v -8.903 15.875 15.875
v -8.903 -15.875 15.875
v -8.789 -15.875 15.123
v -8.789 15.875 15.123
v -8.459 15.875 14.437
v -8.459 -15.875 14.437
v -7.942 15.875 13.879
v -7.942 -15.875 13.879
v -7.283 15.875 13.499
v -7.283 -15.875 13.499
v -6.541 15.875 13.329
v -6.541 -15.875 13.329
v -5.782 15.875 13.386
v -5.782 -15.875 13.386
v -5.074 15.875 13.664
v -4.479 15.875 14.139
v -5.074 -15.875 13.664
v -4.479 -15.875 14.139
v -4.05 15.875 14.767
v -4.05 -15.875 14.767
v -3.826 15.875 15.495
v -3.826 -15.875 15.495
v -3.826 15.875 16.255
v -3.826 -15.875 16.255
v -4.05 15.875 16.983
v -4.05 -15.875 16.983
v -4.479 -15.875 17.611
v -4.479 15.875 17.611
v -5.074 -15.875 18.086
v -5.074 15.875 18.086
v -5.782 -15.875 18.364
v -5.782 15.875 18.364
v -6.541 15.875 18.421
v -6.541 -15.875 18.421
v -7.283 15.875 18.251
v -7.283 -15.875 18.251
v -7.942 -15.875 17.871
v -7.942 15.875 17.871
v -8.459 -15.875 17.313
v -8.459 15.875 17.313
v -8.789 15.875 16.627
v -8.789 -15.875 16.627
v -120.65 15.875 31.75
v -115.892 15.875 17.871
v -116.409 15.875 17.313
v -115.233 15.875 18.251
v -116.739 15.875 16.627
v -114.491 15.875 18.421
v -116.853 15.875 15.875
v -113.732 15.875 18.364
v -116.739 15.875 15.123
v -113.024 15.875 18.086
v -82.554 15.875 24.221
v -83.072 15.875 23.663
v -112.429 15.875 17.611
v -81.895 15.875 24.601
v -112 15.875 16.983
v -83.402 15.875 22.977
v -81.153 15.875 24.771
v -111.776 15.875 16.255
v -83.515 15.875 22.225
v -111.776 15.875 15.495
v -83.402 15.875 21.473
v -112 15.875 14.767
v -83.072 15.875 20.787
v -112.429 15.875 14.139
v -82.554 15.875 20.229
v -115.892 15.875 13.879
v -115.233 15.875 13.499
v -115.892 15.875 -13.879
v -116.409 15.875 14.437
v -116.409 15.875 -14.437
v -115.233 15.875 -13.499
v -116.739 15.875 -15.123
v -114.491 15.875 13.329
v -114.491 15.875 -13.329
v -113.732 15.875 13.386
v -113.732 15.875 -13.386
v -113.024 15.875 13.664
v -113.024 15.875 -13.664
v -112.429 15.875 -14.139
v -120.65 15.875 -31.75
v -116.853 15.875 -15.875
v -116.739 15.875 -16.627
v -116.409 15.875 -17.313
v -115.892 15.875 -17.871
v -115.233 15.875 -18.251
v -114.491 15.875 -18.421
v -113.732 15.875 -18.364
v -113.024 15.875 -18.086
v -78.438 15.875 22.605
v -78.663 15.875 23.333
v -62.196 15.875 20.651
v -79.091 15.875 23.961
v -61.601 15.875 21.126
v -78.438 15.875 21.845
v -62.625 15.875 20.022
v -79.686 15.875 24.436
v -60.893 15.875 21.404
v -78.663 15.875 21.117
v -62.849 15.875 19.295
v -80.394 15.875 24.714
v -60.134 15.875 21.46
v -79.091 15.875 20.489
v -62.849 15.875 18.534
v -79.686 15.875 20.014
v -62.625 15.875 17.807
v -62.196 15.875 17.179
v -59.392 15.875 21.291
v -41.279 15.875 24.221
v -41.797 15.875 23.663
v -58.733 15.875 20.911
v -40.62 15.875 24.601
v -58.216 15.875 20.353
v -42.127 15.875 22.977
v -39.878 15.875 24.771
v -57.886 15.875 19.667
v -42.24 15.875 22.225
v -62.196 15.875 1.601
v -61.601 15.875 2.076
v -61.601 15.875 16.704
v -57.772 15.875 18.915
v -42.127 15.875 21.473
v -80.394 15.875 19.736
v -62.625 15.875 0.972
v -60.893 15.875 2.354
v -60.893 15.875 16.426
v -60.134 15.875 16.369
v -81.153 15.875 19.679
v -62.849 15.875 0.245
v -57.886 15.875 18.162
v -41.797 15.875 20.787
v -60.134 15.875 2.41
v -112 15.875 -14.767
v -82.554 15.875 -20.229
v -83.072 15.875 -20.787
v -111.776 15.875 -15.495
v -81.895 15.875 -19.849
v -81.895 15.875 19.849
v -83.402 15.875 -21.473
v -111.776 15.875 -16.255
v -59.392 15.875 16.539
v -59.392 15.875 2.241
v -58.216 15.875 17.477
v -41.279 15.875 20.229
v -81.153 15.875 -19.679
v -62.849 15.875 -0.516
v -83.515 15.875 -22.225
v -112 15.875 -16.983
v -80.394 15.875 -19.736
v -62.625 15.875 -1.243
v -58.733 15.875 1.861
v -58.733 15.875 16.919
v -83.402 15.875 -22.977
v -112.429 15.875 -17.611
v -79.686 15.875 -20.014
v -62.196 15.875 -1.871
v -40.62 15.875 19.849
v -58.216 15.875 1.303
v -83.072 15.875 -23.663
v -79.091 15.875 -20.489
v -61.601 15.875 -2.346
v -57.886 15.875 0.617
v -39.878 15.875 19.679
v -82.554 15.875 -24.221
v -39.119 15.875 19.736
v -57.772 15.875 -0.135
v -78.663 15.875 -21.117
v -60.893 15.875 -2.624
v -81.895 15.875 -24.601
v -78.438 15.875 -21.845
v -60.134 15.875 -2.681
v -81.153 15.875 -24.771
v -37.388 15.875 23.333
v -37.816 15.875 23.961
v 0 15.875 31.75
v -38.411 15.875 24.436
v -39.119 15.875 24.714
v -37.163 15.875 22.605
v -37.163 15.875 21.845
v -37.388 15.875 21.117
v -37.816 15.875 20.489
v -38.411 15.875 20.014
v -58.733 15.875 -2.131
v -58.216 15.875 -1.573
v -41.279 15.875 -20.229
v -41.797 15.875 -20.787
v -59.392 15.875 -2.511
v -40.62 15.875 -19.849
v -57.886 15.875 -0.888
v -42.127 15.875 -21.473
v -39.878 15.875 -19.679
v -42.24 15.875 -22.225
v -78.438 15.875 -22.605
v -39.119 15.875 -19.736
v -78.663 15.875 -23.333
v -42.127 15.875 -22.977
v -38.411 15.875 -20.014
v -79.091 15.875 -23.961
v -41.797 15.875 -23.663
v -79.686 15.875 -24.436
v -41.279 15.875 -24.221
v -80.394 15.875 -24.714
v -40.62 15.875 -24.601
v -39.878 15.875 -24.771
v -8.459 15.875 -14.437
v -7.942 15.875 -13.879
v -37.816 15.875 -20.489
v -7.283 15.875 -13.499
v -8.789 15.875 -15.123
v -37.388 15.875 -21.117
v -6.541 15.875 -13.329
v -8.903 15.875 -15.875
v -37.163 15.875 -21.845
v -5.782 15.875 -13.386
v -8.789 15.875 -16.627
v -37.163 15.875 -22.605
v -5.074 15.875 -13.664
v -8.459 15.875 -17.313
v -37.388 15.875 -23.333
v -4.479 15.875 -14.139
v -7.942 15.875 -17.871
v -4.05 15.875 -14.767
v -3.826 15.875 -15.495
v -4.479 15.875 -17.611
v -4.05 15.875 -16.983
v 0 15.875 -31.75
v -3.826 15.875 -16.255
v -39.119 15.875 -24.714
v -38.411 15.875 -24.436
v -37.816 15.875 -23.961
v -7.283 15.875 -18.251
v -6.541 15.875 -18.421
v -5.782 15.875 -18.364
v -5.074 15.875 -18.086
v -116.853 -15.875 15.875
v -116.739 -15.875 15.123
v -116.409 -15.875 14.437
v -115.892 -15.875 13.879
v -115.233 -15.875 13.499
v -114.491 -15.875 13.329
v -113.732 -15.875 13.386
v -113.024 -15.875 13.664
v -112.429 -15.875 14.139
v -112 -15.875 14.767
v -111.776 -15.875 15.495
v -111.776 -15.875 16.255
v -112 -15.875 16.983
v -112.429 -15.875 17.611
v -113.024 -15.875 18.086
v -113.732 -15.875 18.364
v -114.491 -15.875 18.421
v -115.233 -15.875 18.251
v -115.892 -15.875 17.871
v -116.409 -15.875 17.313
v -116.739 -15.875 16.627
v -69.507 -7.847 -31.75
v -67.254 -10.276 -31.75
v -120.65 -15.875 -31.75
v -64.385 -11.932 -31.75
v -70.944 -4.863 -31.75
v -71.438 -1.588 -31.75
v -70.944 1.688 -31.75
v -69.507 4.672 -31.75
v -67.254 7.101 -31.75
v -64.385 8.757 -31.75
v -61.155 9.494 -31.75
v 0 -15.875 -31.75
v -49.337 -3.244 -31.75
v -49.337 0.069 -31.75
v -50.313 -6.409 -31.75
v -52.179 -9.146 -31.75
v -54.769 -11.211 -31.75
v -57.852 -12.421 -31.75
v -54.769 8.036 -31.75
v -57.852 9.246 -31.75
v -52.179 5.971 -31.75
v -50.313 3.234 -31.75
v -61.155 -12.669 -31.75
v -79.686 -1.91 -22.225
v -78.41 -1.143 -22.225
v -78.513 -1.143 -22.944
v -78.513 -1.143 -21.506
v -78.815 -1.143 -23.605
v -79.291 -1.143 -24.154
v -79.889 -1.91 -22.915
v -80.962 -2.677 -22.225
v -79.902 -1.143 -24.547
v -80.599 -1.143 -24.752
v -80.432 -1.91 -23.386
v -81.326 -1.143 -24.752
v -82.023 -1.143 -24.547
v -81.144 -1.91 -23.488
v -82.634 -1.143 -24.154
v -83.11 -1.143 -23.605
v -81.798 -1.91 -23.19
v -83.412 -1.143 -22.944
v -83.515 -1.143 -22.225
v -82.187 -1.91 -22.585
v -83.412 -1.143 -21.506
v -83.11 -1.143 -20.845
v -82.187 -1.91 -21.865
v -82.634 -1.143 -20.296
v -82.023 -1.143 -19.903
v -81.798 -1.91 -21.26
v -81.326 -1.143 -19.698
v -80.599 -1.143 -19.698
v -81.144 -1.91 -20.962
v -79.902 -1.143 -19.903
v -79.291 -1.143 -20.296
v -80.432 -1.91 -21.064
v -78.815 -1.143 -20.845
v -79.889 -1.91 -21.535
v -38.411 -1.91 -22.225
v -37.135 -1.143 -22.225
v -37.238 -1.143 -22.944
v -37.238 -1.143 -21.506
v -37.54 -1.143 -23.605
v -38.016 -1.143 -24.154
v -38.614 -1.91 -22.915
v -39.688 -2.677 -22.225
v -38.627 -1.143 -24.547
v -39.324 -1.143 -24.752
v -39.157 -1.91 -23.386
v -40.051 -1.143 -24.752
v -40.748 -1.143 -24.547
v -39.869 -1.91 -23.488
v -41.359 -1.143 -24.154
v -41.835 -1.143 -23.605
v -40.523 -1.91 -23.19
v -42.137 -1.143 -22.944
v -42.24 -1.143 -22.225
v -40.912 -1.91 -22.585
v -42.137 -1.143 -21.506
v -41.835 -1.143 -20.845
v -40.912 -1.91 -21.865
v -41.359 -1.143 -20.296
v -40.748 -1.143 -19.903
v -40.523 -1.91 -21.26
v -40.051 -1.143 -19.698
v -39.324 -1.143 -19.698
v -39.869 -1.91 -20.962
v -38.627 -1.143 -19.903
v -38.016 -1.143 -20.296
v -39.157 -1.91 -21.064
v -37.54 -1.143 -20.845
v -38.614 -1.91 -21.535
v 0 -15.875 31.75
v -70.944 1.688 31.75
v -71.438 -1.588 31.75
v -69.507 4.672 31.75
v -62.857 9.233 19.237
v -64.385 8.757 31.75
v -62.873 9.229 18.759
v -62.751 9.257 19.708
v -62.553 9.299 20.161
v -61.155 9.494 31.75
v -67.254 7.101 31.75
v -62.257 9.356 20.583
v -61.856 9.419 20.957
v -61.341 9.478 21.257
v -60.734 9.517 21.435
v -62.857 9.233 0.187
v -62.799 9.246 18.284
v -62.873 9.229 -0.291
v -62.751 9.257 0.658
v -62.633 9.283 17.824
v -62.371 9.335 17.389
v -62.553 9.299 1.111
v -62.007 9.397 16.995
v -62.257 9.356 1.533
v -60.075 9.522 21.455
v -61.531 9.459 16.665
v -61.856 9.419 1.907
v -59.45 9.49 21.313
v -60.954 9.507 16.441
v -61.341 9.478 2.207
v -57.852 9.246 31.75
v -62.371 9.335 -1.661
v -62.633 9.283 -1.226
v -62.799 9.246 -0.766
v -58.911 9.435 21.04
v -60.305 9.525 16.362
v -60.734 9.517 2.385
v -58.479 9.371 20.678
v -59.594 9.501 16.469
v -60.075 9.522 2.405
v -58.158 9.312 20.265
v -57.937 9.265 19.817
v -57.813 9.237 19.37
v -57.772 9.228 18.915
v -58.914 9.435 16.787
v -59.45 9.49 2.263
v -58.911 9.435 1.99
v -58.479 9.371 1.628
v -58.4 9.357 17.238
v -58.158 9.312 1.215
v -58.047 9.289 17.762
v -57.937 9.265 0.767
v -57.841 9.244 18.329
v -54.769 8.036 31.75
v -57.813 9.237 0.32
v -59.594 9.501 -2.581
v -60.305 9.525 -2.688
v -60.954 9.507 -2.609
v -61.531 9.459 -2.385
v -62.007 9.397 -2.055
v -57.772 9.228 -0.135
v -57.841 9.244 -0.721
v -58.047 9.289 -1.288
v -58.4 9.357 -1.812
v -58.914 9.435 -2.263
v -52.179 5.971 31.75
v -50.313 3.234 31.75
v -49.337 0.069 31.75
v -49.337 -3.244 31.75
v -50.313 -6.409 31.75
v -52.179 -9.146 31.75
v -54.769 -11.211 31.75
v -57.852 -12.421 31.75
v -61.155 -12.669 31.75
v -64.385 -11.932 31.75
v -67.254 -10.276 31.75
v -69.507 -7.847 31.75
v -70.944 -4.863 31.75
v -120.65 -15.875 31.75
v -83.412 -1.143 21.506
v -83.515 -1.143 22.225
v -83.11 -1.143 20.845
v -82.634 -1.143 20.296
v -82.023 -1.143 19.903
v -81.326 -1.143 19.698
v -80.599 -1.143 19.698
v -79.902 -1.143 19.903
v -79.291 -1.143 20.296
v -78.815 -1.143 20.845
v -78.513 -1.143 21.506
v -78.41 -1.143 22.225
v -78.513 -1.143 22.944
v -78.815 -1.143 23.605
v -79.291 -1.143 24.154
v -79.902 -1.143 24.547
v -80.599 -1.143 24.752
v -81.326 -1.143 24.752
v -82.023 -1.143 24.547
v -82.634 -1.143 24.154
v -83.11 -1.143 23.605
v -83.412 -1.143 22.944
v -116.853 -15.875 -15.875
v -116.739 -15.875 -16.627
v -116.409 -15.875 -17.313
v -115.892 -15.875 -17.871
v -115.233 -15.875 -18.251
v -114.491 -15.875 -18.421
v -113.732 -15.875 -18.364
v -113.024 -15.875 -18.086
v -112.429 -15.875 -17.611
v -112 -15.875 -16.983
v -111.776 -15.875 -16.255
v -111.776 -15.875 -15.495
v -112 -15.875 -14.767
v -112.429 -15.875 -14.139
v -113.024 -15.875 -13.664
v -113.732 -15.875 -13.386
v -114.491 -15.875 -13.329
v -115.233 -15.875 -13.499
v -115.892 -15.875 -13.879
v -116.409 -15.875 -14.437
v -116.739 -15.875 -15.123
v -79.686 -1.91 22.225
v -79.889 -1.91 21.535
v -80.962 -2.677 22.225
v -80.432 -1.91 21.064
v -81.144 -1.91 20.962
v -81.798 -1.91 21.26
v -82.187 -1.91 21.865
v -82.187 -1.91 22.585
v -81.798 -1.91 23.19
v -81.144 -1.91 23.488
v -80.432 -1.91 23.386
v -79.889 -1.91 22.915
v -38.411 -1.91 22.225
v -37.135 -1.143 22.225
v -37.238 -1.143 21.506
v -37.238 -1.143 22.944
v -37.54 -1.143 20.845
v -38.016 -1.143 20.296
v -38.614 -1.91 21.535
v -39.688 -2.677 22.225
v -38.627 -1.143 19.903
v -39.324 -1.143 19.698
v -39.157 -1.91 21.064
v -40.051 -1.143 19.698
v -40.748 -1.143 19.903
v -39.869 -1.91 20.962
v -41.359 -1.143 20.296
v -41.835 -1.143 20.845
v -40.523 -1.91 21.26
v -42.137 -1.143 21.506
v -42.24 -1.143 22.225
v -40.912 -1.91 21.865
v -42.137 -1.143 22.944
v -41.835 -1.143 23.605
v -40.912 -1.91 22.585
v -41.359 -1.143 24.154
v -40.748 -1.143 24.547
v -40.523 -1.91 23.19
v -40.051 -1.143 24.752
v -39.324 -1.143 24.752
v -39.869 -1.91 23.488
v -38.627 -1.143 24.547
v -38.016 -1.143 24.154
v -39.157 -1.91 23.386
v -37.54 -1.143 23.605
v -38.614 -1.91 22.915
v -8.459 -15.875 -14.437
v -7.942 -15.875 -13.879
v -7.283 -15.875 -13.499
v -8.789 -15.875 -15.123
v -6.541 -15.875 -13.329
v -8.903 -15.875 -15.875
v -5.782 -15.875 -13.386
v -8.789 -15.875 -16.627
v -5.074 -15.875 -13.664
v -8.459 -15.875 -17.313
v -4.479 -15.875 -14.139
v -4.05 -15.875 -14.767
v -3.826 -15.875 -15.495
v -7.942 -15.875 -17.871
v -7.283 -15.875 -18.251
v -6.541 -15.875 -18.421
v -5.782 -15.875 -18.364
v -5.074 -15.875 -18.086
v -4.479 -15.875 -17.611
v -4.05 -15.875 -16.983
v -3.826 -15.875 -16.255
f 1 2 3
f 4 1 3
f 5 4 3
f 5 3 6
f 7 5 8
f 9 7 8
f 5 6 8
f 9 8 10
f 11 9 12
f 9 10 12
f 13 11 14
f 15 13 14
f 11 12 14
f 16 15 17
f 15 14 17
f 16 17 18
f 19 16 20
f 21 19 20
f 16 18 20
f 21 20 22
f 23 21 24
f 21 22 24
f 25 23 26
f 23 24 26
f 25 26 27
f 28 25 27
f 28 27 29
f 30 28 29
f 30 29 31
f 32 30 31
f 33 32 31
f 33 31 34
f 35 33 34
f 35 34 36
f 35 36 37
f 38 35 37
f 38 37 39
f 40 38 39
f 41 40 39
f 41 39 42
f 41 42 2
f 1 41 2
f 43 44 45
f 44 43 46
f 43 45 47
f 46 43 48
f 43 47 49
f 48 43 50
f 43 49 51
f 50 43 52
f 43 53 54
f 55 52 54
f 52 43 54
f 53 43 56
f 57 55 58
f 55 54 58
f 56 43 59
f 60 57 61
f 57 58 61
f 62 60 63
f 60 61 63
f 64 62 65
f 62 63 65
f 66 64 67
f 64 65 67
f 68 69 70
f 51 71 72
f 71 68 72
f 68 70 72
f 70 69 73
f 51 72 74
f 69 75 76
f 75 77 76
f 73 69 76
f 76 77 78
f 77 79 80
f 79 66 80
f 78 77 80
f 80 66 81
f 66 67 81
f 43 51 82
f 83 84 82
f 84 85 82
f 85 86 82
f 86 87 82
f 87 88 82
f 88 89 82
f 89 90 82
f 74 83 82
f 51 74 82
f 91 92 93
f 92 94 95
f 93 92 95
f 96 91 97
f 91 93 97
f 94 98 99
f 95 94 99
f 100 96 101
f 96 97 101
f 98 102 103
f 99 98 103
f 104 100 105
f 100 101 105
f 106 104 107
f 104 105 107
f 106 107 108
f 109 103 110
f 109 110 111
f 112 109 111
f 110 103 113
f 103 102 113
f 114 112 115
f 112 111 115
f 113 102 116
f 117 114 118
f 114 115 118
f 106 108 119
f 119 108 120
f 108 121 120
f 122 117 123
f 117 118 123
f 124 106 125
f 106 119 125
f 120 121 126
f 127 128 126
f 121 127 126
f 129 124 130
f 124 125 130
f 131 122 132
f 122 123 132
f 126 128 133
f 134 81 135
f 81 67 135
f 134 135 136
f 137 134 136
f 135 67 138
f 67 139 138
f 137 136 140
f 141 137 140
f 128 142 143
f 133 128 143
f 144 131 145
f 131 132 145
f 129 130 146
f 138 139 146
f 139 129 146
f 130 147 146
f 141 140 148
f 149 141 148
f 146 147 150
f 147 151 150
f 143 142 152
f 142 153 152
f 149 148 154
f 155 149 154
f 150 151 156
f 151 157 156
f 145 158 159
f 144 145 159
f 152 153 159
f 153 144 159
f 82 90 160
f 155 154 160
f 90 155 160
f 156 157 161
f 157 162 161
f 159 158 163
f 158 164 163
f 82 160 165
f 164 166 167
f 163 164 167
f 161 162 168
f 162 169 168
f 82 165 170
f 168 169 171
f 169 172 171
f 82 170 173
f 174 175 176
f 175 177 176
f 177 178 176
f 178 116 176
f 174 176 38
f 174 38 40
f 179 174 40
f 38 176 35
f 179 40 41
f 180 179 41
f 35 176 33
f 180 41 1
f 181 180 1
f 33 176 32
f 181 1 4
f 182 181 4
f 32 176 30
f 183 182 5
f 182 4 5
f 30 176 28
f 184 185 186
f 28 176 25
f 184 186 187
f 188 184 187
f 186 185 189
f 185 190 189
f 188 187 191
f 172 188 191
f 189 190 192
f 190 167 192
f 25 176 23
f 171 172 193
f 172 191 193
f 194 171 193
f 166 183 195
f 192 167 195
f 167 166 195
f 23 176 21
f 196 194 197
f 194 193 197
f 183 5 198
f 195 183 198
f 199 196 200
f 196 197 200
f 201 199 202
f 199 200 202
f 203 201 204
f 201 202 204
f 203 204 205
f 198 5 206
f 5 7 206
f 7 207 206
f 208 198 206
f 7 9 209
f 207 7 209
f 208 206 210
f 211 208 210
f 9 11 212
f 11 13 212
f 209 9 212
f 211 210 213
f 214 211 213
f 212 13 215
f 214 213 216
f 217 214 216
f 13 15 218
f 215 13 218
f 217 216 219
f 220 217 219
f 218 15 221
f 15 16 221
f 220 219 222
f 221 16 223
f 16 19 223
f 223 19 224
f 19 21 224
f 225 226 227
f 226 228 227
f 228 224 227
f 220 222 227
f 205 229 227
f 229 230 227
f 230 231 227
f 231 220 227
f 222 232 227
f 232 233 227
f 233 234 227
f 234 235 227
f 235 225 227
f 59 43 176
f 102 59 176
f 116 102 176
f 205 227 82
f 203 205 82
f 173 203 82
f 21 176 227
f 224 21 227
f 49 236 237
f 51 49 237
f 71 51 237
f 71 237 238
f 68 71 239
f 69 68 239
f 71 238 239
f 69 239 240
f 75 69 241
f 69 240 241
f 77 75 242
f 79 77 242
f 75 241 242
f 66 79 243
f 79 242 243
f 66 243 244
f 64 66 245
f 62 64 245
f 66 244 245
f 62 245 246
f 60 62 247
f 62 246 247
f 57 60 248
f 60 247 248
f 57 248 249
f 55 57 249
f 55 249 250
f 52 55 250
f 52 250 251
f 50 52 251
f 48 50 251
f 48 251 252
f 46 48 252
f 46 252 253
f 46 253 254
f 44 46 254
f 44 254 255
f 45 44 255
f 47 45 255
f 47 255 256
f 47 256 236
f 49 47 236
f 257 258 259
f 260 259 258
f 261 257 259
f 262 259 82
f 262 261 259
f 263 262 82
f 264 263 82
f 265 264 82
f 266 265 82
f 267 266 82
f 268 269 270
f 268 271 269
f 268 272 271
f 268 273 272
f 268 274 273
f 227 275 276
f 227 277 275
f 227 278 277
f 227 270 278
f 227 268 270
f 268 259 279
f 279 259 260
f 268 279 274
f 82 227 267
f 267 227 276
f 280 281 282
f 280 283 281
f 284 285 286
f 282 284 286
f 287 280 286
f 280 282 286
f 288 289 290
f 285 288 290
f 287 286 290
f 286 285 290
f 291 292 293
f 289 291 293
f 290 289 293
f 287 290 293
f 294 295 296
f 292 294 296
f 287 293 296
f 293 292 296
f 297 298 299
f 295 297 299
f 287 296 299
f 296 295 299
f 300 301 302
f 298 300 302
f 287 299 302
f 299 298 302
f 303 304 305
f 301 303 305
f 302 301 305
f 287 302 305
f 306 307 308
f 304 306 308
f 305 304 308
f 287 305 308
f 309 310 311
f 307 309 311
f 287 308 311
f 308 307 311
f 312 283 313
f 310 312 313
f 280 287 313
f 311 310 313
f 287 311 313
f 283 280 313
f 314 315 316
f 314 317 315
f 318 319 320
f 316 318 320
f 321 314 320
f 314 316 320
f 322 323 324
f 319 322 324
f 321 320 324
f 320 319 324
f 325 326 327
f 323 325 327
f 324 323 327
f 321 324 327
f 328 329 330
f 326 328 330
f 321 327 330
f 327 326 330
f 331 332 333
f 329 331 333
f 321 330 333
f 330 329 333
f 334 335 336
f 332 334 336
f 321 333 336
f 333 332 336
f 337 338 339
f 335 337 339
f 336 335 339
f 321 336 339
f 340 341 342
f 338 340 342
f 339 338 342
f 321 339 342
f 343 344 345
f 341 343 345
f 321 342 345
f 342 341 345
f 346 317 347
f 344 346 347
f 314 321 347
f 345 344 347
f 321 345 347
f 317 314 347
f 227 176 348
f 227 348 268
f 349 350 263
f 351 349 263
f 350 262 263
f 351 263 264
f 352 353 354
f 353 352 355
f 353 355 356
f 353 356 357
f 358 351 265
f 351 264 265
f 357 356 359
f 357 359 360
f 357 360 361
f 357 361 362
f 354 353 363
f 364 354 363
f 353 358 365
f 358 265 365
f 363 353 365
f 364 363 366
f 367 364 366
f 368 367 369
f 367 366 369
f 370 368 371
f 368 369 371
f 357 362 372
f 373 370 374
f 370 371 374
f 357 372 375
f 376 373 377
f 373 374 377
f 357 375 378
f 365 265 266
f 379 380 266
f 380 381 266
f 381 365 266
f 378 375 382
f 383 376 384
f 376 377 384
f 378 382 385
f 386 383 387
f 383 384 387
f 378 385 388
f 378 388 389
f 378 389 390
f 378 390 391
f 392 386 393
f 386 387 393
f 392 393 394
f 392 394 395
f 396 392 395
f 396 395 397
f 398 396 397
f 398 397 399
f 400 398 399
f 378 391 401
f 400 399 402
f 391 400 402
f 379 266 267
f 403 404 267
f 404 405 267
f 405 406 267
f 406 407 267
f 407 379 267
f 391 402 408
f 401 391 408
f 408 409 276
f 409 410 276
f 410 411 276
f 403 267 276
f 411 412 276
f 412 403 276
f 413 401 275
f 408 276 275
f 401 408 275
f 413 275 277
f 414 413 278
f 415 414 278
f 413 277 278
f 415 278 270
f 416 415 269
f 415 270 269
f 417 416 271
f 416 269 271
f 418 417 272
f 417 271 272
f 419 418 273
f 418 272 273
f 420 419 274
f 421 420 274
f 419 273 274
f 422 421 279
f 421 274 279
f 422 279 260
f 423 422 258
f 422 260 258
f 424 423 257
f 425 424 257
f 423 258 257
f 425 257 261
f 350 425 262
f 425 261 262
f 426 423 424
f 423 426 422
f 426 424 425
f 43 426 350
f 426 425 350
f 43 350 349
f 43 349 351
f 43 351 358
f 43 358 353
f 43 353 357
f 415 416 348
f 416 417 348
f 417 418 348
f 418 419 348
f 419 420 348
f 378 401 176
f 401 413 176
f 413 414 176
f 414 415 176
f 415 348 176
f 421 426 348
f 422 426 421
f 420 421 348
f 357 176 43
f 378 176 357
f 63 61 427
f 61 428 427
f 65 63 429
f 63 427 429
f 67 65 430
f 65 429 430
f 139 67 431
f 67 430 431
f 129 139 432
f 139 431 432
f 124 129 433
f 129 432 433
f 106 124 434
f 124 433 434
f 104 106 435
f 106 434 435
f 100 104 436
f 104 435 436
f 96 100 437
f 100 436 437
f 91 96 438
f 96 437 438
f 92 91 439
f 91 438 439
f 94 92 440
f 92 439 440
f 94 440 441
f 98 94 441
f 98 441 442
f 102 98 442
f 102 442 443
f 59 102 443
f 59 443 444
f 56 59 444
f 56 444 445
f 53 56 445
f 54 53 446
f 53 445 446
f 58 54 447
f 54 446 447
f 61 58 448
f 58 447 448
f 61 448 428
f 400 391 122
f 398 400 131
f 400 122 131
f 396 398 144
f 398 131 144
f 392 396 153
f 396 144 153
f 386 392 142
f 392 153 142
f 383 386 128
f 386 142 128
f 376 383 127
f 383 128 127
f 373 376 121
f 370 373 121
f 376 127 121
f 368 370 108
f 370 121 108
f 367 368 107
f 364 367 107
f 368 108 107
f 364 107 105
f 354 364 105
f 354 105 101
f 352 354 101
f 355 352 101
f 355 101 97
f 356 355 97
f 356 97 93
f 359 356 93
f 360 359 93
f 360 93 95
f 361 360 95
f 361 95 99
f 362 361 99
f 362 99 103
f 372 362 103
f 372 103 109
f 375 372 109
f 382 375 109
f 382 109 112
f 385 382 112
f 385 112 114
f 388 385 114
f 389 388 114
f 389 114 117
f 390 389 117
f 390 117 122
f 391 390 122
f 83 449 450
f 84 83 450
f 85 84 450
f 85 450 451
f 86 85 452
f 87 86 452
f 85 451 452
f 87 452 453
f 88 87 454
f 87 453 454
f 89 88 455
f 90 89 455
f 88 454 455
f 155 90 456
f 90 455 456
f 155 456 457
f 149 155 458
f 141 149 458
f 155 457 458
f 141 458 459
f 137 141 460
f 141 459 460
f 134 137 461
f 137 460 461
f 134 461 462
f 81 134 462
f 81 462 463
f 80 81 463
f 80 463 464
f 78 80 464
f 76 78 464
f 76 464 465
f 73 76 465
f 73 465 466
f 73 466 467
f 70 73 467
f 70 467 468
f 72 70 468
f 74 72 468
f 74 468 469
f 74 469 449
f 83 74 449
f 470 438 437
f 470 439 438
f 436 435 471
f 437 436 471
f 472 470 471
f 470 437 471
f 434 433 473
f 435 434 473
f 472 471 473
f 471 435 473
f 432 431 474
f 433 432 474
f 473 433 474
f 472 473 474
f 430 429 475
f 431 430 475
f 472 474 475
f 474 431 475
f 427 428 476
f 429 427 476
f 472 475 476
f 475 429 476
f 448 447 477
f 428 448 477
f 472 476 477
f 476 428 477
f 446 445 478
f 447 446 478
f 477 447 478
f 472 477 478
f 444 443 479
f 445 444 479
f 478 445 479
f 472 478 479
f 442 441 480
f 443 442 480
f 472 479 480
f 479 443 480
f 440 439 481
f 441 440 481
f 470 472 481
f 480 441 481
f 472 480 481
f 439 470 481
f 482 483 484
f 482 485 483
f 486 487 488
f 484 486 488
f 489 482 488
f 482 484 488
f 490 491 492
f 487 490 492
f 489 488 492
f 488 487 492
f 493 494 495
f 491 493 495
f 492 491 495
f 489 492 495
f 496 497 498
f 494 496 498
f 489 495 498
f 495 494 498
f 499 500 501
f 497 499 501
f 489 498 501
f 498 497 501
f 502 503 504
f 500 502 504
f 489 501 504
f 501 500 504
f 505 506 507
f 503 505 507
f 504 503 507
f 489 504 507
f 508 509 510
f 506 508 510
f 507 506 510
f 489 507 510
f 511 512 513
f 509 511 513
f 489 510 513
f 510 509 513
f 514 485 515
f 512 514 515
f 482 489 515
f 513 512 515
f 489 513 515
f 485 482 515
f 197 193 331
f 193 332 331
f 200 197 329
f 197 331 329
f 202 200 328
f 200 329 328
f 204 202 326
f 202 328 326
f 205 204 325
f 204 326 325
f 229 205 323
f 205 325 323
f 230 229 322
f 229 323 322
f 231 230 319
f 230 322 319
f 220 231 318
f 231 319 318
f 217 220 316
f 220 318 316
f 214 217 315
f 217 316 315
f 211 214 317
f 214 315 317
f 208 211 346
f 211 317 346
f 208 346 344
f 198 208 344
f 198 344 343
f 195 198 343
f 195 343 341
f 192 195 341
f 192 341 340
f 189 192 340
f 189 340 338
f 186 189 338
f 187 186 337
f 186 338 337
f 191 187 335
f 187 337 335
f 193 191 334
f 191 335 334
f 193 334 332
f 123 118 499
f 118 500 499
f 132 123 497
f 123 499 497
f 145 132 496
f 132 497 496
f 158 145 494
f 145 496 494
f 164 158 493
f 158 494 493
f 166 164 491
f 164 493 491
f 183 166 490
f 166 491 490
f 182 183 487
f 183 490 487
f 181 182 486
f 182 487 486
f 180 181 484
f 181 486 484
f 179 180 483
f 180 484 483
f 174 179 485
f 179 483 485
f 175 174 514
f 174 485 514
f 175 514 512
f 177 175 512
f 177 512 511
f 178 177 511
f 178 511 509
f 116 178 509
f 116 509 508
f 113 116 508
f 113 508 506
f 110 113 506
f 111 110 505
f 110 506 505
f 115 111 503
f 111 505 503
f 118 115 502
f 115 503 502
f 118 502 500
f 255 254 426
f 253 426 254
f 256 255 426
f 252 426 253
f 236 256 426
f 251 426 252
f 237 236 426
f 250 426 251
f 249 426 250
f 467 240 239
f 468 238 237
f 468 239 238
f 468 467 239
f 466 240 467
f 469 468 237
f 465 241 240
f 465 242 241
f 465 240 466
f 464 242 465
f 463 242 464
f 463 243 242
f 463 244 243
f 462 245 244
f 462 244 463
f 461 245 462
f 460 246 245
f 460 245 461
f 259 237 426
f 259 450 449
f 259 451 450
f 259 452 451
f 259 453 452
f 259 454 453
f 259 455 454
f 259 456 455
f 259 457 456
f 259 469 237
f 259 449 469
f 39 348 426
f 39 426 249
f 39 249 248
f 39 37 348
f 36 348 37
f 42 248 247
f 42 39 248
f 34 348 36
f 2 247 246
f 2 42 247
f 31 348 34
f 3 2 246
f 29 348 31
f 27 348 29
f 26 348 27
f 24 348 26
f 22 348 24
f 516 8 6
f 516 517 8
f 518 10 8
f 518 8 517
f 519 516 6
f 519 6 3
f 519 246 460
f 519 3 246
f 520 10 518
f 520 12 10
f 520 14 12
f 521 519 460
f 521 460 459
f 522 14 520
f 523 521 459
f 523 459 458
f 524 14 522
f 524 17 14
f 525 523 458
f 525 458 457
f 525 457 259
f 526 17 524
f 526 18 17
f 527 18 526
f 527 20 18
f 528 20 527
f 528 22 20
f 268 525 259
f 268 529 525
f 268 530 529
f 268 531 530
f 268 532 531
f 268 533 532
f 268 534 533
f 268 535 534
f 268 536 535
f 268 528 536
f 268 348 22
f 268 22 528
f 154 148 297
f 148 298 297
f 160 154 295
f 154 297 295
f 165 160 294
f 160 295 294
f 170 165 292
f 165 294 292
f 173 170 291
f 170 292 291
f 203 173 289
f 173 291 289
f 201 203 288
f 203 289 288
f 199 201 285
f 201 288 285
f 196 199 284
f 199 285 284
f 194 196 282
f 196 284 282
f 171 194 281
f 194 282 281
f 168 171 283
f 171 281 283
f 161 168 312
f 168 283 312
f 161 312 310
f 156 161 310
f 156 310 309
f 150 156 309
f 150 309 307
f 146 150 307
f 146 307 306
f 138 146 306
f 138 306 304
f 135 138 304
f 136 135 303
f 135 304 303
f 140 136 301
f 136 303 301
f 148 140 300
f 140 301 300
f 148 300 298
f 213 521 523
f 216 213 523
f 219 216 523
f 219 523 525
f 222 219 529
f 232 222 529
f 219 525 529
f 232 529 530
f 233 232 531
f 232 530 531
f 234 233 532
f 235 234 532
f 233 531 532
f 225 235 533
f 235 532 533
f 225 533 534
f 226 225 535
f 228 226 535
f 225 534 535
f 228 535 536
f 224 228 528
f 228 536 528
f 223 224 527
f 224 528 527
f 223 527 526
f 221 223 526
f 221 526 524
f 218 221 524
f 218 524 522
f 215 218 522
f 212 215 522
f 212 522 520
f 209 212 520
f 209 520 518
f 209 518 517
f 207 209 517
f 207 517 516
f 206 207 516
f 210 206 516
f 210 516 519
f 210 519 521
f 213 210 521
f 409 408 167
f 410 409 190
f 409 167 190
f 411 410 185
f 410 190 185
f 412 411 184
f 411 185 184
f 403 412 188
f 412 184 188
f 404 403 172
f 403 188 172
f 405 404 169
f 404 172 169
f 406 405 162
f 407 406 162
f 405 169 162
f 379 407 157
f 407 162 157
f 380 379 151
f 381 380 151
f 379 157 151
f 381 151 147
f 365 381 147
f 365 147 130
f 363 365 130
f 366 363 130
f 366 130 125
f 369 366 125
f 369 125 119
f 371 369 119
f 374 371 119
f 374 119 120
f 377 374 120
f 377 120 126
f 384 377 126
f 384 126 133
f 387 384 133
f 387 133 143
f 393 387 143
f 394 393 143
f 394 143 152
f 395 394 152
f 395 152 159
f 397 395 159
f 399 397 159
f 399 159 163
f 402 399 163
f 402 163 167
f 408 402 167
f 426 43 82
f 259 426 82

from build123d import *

# Parameters (mm, degrees)
SKETCH1_W                              = 63.5
SKETCH1_H                              = 31.75
BOSS_EXTRUDE1_DEPTH                    = 120.65
HOLE1_D                                = 22.225
TAPPED_HOLE_FOR_10_32_HELICOIL3_REACH  = 120.859
TAPPED_HOLE_FOR_10_32_HELICOIL3_BORE_R = 2.5527
TAPPED_HOLE_FOR_10_32_HELICOIL4_D      = 5.1054
TAPPED_HOLE_FOR_10_32_HELICOIL5_D      = 5.1054
TAPPED_HOLE_FOR_10_32_HELICOIL5_DEPTH  = 17.018
TAPPED_HOLE_FOR_10_32_HELICOIL5_TIP    = 1.533816902


with BuildPart() as part:
    # Sketch1 → Boss-Extrude1 (new body)
    with BuildSketch(Plane(origin=(0, 0, 0), x_dir=(0, 0, -1), z_dir=(1, 0, 0))):
        Rectangle(SKETCH1_W, SKETCH1_H)
    extrude(amount=-BOSS_EXTRUDE1_DEPTH)

    # Hole1 (through all)
    with Locations(Plane.XY.offset(31.75)):
        with Locations((-60.325, -1.5875)):
            Hole(HOLE1_D / 2)

    # Tapped Hole for #10-32 Helicoil3 bore → Tapped Hole for #10-32 Helicoil3 (cut, up to next)
    with BuildSketch(Plane(origin=(-13.662401891, 15.875, 9.153963567), x_dir=(1, 0, 0), z_dir=(0, 1, 0)), mode=Mode.PRIVATE) as tapped_hole_for_10_32_helicoil3_sk1:
        with Locations((-46.662598109, 9.289125094)):
            Circle(TAPPED_HOLE_FOR_10_32_HELICOIL3_BORE_R)
    tapped_hole_for_10_32_helicoil3_tool1 = extrude(tapped_hole_for_10_32_helicoil3_sk1.sketch, amount=-TAPPED_HOLE_FOR_10_32_HELICOIL3_REACH, mode=Mode.PRIVATE) & part.part
    # Tapped Hole for #10-32 Helicoil3 bore → Tapped Hole for #10-32 Helicoil3 (cut, up to next)
    with BuildSketch(Plane(origin=(-13.662401891, 15.875, 9.153963567), x_dir=(1, 0, 0), z_dir=(0, 1, 0)), mode=Mode.PRIVATE) as tapped_hole_for_10_32_helicoil3_sk2:
        with Locations((-46.662598109, -9.760874906)):
            Circle(TAPPED_HOLE_FOR_10_32_HELICOIL3_BORE_R)
    tapped_hole_for_10_32_helicoil3_tool2 = extrude(tapped_hole_for_10_32_helicoil3_sk2.sketch, amount=-TAPPED_HOLE_FOR_10_32_HELICOIL3_REACH, mode=Mode.PRIVATE) & part.part
    add(tapped_hole_for_10_32_helicoil3_tool1.solids().sort_by_distance((-60.325, 15.875, -0.135162))[0], mode=Mode.SUBTRACT)
    add(tapped_hole_for_10_32_helicoil3_tool2.solids().sort_by_distance((-60.325, 15.875, 18.914838))[0], mode=Mode.SUBTRACT)

    # Tapped Hole for #10-32 Helicoil4 (through all)
    with Locations(Plane(origin=(0, 15.875, 0), x_dir=(1, 0, 0), z_dir=(0, 1, 0))):
        with Locations((-114.3, 15.875), (-114.3, -15.875), (-6.35, -15.875), (-6.35, 15.875)):
            Hole(TAPPED_HOLE_FOR_10_32_HELICOIL4_D / 2)

    # Tapped Hole for #10-32 Helicoil5
    with Locations(Plane(origin=(0, 15.875, 0), x_dir=(1, 0, 0), z_dir=(0, 1, 0))):
        with Locations((-80.9625, 22.225), (-39.6875, -22.225), (-80.9625, -22.225), (-39.6875, 22.225)):
            Hole(TAPPED_HOLE_FOR_10_32_HELICOIL5_D / 2, depth=TAPPED_HOLE_FOR_10_32_HELICOIL5_DEPTH)
            with Locations((0, 0, -(TAPPED_HOLE_FOR_10_32_HELICOIL5_DEPTH + TAPPED_HOLE_FOR_10_32_HELICOIL5_TIP / 2))):  # 118° drill point
                Cone(0, TAPPED_HOLE_FOR_10_32_HELICOIL5_D / 2, TAPPED_HOLE_FOR_10_32_HELICOIL5_TIP, mode=Mode.SUBTRACT)


solid = part.part
